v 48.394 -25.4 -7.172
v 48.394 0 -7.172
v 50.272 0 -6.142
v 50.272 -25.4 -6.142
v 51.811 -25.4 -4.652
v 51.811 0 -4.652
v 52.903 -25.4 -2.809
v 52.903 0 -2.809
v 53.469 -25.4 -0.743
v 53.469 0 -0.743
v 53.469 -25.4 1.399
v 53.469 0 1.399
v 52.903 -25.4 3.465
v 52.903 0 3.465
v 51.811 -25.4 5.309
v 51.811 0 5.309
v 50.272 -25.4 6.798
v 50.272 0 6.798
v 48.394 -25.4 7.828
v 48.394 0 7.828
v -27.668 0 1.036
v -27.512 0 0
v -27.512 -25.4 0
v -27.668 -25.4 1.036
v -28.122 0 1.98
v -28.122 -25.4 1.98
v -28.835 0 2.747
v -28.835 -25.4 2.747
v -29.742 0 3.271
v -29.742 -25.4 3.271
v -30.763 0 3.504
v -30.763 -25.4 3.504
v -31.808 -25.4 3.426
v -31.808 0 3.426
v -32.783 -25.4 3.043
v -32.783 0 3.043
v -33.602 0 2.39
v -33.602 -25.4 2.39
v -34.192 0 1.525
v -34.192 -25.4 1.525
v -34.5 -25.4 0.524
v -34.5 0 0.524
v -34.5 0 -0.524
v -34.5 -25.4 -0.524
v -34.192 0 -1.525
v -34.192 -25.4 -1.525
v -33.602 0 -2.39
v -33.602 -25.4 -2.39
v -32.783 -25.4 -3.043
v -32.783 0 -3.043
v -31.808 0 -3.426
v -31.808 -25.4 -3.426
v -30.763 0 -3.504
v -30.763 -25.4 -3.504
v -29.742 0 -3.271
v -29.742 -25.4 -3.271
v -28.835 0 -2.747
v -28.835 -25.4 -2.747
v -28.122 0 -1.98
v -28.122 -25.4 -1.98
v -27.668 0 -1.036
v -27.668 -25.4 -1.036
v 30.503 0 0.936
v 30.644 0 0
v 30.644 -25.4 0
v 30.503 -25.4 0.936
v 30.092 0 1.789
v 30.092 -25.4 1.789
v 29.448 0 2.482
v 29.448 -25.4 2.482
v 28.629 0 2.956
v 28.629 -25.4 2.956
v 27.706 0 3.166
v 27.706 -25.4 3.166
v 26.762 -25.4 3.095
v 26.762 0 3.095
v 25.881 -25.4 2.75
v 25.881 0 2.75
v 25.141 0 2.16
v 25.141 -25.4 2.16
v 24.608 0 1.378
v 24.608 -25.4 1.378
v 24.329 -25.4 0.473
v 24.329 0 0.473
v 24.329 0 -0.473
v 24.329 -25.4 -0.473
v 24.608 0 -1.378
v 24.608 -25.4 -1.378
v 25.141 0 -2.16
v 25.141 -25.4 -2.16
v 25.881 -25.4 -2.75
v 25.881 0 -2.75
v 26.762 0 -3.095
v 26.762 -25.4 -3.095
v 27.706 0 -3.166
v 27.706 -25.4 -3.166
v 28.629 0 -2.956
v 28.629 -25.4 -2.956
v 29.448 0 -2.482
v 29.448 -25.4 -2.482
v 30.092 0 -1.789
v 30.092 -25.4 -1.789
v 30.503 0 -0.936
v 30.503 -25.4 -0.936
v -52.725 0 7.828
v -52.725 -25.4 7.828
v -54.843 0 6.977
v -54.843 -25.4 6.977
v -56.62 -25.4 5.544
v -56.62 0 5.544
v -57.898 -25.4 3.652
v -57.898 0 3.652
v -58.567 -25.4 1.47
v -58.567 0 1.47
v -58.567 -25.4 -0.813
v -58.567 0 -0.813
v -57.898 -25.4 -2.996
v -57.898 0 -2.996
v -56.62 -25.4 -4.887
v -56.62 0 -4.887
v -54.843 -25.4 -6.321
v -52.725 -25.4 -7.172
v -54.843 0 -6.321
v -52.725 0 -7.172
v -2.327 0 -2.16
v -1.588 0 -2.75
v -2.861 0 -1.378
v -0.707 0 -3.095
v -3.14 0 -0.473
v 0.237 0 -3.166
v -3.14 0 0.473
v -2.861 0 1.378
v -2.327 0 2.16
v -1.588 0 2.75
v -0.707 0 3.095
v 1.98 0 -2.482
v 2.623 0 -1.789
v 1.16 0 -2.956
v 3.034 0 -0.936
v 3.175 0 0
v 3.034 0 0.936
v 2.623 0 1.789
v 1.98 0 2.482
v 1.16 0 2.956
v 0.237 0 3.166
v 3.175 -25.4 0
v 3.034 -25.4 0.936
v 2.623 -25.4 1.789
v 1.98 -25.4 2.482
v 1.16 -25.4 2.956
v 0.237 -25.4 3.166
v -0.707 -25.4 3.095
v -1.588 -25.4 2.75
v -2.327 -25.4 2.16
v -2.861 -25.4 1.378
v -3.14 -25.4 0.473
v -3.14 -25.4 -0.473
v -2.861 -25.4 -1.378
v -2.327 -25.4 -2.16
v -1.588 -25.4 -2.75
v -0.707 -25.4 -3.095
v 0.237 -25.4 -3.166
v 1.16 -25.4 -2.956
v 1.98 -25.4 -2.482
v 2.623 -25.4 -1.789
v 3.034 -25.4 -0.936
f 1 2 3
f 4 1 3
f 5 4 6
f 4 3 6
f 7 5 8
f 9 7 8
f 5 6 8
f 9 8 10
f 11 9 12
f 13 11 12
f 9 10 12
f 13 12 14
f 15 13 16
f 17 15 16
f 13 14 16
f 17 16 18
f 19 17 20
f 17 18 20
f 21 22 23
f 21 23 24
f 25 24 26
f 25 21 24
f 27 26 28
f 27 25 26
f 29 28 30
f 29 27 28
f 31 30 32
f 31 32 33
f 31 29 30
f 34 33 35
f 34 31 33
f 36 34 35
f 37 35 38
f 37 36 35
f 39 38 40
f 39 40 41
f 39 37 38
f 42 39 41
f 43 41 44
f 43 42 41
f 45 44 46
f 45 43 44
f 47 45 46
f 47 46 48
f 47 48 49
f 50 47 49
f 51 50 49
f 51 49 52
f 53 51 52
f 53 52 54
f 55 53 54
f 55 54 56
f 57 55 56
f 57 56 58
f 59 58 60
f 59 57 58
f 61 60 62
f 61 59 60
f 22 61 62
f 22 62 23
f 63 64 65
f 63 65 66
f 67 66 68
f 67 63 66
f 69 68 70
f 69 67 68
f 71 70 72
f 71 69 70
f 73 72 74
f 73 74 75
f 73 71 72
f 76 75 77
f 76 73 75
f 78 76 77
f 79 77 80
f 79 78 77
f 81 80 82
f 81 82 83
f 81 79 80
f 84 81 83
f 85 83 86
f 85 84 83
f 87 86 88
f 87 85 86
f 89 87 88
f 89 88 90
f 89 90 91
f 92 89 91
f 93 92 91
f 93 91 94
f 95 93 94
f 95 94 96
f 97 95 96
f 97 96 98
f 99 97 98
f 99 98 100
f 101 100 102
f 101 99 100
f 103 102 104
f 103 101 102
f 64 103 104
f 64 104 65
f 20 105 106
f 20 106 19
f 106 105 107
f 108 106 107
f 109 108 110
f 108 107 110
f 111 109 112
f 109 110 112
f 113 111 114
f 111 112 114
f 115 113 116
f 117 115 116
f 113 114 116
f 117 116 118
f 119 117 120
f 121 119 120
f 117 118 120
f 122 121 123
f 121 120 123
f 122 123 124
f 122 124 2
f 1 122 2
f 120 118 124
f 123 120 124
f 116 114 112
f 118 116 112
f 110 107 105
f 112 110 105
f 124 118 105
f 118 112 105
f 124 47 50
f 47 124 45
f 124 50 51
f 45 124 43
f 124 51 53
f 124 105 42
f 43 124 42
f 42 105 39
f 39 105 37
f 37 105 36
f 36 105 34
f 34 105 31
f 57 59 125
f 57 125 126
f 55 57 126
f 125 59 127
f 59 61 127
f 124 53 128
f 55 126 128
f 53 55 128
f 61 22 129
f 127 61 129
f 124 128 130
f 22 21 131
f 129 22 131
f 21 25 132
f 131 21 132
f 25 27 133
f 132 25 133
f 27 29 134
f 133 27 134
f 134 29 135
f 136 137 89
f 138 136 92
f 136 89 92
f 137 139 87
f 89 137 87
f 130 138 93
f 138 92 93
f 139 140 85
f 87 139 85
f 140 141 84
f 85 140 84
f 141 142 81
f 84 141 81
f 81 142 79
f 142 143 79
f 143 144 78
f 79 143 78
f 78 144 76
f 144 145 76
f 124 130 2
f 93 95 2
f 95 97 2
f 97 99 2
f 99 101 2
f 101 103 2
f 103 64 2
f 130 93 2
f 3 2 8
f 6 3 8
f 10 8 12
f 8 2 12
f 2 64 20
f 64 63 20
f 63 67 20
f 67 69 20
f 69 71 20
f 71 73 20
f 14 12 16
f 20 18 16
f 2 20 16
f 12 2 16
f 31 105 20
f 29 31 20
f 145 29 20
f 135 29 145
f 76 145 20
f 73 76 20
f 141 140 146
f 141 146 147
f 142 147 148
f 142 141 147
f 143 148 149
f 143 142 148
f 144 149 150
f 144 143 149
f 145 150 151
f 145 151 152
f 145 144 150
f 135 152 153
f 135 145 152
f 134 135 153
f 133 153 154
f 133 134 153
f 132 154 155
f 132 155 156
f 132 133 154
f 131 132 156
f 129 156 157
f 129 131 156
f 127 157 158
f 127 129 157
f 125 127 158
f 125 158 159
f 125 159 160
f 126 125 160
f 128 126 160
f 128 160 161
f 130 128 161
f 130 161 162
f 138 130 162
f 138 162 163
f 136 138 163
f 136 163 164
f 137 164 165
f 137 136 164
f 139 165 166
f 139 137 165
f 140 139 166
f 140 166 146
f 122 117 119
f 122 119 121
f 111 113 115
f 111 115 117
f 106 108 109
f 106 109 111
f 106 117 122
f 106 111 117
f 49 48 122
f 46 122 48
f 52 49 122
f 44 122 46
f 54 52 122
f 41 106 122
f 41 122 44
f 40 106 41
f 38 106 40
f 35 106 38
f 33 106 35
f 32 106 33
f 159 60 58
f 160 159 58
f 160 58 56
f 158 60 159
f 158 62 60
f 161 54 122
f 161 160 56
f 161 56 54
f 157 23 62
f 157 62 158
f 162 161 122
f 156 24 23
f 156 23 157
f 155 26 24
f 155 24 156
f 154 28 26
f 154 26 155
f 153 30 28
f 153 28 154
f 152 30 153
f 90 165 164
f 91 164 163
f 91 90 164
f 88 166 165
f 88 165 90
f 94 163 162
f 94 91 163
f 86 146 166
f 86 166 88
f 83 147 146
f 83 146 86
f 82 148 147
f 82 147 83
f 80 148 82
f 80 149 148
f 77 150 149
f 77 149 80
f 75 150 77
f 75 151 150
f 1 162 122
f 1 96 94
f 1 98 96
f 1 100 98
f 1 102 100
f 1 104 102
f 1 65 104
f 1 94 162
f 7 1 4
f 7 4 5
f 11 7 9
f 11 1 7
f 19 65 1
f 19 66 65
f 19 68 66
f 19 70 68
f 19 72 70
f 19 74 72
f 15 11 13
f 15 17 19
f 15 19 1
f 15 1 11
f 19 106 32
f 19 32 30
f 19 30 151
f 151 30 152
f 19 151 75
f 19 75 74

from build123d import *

# Parameters (mm, degrees)
F0_W     = 101.118554
F0_H     = 15
F0_R     = 3.514012
F0_R_2   = 3.175
F1_DEPTH = 25.4


with BuildPart() as f1:
    # F0 (on Front) → F1 (new body)
    with BuildSketch(Plane.XZ):
        with Locations((-2.165472, 0.328236)):
            Rectangle(F0_W, F0_H)
        with Locations((-31.025723, 0)):
            Circle(F0_R, mode=Mode.SUBTRACT)
        Circle(F0_R_2, mode=Mode.SUBTRACT)
        with Locations((27.468633, 0)):
            Circle(F0_R_2, mode=Mode.SUBTRACT)
        with BuildLine():
            Line((-52.724749, -7.171764), (-52.724749, 7.828236))
            ThreePointArc((-52.724749, 7.828236), (-58.651611, 0.328236), (-52.724749, -7.171764))
        make_face()
        with BuildLine():
            ThreePointArc((48.393805, -7.171764), (53.540338, 0.328236), (48.393805, 7.828236))
            Line((48.393805, 7.828236), (48.393805, -7.171764))
        make_face()
    extrude(amount=F1_DEPTH)


solid = f1.part
